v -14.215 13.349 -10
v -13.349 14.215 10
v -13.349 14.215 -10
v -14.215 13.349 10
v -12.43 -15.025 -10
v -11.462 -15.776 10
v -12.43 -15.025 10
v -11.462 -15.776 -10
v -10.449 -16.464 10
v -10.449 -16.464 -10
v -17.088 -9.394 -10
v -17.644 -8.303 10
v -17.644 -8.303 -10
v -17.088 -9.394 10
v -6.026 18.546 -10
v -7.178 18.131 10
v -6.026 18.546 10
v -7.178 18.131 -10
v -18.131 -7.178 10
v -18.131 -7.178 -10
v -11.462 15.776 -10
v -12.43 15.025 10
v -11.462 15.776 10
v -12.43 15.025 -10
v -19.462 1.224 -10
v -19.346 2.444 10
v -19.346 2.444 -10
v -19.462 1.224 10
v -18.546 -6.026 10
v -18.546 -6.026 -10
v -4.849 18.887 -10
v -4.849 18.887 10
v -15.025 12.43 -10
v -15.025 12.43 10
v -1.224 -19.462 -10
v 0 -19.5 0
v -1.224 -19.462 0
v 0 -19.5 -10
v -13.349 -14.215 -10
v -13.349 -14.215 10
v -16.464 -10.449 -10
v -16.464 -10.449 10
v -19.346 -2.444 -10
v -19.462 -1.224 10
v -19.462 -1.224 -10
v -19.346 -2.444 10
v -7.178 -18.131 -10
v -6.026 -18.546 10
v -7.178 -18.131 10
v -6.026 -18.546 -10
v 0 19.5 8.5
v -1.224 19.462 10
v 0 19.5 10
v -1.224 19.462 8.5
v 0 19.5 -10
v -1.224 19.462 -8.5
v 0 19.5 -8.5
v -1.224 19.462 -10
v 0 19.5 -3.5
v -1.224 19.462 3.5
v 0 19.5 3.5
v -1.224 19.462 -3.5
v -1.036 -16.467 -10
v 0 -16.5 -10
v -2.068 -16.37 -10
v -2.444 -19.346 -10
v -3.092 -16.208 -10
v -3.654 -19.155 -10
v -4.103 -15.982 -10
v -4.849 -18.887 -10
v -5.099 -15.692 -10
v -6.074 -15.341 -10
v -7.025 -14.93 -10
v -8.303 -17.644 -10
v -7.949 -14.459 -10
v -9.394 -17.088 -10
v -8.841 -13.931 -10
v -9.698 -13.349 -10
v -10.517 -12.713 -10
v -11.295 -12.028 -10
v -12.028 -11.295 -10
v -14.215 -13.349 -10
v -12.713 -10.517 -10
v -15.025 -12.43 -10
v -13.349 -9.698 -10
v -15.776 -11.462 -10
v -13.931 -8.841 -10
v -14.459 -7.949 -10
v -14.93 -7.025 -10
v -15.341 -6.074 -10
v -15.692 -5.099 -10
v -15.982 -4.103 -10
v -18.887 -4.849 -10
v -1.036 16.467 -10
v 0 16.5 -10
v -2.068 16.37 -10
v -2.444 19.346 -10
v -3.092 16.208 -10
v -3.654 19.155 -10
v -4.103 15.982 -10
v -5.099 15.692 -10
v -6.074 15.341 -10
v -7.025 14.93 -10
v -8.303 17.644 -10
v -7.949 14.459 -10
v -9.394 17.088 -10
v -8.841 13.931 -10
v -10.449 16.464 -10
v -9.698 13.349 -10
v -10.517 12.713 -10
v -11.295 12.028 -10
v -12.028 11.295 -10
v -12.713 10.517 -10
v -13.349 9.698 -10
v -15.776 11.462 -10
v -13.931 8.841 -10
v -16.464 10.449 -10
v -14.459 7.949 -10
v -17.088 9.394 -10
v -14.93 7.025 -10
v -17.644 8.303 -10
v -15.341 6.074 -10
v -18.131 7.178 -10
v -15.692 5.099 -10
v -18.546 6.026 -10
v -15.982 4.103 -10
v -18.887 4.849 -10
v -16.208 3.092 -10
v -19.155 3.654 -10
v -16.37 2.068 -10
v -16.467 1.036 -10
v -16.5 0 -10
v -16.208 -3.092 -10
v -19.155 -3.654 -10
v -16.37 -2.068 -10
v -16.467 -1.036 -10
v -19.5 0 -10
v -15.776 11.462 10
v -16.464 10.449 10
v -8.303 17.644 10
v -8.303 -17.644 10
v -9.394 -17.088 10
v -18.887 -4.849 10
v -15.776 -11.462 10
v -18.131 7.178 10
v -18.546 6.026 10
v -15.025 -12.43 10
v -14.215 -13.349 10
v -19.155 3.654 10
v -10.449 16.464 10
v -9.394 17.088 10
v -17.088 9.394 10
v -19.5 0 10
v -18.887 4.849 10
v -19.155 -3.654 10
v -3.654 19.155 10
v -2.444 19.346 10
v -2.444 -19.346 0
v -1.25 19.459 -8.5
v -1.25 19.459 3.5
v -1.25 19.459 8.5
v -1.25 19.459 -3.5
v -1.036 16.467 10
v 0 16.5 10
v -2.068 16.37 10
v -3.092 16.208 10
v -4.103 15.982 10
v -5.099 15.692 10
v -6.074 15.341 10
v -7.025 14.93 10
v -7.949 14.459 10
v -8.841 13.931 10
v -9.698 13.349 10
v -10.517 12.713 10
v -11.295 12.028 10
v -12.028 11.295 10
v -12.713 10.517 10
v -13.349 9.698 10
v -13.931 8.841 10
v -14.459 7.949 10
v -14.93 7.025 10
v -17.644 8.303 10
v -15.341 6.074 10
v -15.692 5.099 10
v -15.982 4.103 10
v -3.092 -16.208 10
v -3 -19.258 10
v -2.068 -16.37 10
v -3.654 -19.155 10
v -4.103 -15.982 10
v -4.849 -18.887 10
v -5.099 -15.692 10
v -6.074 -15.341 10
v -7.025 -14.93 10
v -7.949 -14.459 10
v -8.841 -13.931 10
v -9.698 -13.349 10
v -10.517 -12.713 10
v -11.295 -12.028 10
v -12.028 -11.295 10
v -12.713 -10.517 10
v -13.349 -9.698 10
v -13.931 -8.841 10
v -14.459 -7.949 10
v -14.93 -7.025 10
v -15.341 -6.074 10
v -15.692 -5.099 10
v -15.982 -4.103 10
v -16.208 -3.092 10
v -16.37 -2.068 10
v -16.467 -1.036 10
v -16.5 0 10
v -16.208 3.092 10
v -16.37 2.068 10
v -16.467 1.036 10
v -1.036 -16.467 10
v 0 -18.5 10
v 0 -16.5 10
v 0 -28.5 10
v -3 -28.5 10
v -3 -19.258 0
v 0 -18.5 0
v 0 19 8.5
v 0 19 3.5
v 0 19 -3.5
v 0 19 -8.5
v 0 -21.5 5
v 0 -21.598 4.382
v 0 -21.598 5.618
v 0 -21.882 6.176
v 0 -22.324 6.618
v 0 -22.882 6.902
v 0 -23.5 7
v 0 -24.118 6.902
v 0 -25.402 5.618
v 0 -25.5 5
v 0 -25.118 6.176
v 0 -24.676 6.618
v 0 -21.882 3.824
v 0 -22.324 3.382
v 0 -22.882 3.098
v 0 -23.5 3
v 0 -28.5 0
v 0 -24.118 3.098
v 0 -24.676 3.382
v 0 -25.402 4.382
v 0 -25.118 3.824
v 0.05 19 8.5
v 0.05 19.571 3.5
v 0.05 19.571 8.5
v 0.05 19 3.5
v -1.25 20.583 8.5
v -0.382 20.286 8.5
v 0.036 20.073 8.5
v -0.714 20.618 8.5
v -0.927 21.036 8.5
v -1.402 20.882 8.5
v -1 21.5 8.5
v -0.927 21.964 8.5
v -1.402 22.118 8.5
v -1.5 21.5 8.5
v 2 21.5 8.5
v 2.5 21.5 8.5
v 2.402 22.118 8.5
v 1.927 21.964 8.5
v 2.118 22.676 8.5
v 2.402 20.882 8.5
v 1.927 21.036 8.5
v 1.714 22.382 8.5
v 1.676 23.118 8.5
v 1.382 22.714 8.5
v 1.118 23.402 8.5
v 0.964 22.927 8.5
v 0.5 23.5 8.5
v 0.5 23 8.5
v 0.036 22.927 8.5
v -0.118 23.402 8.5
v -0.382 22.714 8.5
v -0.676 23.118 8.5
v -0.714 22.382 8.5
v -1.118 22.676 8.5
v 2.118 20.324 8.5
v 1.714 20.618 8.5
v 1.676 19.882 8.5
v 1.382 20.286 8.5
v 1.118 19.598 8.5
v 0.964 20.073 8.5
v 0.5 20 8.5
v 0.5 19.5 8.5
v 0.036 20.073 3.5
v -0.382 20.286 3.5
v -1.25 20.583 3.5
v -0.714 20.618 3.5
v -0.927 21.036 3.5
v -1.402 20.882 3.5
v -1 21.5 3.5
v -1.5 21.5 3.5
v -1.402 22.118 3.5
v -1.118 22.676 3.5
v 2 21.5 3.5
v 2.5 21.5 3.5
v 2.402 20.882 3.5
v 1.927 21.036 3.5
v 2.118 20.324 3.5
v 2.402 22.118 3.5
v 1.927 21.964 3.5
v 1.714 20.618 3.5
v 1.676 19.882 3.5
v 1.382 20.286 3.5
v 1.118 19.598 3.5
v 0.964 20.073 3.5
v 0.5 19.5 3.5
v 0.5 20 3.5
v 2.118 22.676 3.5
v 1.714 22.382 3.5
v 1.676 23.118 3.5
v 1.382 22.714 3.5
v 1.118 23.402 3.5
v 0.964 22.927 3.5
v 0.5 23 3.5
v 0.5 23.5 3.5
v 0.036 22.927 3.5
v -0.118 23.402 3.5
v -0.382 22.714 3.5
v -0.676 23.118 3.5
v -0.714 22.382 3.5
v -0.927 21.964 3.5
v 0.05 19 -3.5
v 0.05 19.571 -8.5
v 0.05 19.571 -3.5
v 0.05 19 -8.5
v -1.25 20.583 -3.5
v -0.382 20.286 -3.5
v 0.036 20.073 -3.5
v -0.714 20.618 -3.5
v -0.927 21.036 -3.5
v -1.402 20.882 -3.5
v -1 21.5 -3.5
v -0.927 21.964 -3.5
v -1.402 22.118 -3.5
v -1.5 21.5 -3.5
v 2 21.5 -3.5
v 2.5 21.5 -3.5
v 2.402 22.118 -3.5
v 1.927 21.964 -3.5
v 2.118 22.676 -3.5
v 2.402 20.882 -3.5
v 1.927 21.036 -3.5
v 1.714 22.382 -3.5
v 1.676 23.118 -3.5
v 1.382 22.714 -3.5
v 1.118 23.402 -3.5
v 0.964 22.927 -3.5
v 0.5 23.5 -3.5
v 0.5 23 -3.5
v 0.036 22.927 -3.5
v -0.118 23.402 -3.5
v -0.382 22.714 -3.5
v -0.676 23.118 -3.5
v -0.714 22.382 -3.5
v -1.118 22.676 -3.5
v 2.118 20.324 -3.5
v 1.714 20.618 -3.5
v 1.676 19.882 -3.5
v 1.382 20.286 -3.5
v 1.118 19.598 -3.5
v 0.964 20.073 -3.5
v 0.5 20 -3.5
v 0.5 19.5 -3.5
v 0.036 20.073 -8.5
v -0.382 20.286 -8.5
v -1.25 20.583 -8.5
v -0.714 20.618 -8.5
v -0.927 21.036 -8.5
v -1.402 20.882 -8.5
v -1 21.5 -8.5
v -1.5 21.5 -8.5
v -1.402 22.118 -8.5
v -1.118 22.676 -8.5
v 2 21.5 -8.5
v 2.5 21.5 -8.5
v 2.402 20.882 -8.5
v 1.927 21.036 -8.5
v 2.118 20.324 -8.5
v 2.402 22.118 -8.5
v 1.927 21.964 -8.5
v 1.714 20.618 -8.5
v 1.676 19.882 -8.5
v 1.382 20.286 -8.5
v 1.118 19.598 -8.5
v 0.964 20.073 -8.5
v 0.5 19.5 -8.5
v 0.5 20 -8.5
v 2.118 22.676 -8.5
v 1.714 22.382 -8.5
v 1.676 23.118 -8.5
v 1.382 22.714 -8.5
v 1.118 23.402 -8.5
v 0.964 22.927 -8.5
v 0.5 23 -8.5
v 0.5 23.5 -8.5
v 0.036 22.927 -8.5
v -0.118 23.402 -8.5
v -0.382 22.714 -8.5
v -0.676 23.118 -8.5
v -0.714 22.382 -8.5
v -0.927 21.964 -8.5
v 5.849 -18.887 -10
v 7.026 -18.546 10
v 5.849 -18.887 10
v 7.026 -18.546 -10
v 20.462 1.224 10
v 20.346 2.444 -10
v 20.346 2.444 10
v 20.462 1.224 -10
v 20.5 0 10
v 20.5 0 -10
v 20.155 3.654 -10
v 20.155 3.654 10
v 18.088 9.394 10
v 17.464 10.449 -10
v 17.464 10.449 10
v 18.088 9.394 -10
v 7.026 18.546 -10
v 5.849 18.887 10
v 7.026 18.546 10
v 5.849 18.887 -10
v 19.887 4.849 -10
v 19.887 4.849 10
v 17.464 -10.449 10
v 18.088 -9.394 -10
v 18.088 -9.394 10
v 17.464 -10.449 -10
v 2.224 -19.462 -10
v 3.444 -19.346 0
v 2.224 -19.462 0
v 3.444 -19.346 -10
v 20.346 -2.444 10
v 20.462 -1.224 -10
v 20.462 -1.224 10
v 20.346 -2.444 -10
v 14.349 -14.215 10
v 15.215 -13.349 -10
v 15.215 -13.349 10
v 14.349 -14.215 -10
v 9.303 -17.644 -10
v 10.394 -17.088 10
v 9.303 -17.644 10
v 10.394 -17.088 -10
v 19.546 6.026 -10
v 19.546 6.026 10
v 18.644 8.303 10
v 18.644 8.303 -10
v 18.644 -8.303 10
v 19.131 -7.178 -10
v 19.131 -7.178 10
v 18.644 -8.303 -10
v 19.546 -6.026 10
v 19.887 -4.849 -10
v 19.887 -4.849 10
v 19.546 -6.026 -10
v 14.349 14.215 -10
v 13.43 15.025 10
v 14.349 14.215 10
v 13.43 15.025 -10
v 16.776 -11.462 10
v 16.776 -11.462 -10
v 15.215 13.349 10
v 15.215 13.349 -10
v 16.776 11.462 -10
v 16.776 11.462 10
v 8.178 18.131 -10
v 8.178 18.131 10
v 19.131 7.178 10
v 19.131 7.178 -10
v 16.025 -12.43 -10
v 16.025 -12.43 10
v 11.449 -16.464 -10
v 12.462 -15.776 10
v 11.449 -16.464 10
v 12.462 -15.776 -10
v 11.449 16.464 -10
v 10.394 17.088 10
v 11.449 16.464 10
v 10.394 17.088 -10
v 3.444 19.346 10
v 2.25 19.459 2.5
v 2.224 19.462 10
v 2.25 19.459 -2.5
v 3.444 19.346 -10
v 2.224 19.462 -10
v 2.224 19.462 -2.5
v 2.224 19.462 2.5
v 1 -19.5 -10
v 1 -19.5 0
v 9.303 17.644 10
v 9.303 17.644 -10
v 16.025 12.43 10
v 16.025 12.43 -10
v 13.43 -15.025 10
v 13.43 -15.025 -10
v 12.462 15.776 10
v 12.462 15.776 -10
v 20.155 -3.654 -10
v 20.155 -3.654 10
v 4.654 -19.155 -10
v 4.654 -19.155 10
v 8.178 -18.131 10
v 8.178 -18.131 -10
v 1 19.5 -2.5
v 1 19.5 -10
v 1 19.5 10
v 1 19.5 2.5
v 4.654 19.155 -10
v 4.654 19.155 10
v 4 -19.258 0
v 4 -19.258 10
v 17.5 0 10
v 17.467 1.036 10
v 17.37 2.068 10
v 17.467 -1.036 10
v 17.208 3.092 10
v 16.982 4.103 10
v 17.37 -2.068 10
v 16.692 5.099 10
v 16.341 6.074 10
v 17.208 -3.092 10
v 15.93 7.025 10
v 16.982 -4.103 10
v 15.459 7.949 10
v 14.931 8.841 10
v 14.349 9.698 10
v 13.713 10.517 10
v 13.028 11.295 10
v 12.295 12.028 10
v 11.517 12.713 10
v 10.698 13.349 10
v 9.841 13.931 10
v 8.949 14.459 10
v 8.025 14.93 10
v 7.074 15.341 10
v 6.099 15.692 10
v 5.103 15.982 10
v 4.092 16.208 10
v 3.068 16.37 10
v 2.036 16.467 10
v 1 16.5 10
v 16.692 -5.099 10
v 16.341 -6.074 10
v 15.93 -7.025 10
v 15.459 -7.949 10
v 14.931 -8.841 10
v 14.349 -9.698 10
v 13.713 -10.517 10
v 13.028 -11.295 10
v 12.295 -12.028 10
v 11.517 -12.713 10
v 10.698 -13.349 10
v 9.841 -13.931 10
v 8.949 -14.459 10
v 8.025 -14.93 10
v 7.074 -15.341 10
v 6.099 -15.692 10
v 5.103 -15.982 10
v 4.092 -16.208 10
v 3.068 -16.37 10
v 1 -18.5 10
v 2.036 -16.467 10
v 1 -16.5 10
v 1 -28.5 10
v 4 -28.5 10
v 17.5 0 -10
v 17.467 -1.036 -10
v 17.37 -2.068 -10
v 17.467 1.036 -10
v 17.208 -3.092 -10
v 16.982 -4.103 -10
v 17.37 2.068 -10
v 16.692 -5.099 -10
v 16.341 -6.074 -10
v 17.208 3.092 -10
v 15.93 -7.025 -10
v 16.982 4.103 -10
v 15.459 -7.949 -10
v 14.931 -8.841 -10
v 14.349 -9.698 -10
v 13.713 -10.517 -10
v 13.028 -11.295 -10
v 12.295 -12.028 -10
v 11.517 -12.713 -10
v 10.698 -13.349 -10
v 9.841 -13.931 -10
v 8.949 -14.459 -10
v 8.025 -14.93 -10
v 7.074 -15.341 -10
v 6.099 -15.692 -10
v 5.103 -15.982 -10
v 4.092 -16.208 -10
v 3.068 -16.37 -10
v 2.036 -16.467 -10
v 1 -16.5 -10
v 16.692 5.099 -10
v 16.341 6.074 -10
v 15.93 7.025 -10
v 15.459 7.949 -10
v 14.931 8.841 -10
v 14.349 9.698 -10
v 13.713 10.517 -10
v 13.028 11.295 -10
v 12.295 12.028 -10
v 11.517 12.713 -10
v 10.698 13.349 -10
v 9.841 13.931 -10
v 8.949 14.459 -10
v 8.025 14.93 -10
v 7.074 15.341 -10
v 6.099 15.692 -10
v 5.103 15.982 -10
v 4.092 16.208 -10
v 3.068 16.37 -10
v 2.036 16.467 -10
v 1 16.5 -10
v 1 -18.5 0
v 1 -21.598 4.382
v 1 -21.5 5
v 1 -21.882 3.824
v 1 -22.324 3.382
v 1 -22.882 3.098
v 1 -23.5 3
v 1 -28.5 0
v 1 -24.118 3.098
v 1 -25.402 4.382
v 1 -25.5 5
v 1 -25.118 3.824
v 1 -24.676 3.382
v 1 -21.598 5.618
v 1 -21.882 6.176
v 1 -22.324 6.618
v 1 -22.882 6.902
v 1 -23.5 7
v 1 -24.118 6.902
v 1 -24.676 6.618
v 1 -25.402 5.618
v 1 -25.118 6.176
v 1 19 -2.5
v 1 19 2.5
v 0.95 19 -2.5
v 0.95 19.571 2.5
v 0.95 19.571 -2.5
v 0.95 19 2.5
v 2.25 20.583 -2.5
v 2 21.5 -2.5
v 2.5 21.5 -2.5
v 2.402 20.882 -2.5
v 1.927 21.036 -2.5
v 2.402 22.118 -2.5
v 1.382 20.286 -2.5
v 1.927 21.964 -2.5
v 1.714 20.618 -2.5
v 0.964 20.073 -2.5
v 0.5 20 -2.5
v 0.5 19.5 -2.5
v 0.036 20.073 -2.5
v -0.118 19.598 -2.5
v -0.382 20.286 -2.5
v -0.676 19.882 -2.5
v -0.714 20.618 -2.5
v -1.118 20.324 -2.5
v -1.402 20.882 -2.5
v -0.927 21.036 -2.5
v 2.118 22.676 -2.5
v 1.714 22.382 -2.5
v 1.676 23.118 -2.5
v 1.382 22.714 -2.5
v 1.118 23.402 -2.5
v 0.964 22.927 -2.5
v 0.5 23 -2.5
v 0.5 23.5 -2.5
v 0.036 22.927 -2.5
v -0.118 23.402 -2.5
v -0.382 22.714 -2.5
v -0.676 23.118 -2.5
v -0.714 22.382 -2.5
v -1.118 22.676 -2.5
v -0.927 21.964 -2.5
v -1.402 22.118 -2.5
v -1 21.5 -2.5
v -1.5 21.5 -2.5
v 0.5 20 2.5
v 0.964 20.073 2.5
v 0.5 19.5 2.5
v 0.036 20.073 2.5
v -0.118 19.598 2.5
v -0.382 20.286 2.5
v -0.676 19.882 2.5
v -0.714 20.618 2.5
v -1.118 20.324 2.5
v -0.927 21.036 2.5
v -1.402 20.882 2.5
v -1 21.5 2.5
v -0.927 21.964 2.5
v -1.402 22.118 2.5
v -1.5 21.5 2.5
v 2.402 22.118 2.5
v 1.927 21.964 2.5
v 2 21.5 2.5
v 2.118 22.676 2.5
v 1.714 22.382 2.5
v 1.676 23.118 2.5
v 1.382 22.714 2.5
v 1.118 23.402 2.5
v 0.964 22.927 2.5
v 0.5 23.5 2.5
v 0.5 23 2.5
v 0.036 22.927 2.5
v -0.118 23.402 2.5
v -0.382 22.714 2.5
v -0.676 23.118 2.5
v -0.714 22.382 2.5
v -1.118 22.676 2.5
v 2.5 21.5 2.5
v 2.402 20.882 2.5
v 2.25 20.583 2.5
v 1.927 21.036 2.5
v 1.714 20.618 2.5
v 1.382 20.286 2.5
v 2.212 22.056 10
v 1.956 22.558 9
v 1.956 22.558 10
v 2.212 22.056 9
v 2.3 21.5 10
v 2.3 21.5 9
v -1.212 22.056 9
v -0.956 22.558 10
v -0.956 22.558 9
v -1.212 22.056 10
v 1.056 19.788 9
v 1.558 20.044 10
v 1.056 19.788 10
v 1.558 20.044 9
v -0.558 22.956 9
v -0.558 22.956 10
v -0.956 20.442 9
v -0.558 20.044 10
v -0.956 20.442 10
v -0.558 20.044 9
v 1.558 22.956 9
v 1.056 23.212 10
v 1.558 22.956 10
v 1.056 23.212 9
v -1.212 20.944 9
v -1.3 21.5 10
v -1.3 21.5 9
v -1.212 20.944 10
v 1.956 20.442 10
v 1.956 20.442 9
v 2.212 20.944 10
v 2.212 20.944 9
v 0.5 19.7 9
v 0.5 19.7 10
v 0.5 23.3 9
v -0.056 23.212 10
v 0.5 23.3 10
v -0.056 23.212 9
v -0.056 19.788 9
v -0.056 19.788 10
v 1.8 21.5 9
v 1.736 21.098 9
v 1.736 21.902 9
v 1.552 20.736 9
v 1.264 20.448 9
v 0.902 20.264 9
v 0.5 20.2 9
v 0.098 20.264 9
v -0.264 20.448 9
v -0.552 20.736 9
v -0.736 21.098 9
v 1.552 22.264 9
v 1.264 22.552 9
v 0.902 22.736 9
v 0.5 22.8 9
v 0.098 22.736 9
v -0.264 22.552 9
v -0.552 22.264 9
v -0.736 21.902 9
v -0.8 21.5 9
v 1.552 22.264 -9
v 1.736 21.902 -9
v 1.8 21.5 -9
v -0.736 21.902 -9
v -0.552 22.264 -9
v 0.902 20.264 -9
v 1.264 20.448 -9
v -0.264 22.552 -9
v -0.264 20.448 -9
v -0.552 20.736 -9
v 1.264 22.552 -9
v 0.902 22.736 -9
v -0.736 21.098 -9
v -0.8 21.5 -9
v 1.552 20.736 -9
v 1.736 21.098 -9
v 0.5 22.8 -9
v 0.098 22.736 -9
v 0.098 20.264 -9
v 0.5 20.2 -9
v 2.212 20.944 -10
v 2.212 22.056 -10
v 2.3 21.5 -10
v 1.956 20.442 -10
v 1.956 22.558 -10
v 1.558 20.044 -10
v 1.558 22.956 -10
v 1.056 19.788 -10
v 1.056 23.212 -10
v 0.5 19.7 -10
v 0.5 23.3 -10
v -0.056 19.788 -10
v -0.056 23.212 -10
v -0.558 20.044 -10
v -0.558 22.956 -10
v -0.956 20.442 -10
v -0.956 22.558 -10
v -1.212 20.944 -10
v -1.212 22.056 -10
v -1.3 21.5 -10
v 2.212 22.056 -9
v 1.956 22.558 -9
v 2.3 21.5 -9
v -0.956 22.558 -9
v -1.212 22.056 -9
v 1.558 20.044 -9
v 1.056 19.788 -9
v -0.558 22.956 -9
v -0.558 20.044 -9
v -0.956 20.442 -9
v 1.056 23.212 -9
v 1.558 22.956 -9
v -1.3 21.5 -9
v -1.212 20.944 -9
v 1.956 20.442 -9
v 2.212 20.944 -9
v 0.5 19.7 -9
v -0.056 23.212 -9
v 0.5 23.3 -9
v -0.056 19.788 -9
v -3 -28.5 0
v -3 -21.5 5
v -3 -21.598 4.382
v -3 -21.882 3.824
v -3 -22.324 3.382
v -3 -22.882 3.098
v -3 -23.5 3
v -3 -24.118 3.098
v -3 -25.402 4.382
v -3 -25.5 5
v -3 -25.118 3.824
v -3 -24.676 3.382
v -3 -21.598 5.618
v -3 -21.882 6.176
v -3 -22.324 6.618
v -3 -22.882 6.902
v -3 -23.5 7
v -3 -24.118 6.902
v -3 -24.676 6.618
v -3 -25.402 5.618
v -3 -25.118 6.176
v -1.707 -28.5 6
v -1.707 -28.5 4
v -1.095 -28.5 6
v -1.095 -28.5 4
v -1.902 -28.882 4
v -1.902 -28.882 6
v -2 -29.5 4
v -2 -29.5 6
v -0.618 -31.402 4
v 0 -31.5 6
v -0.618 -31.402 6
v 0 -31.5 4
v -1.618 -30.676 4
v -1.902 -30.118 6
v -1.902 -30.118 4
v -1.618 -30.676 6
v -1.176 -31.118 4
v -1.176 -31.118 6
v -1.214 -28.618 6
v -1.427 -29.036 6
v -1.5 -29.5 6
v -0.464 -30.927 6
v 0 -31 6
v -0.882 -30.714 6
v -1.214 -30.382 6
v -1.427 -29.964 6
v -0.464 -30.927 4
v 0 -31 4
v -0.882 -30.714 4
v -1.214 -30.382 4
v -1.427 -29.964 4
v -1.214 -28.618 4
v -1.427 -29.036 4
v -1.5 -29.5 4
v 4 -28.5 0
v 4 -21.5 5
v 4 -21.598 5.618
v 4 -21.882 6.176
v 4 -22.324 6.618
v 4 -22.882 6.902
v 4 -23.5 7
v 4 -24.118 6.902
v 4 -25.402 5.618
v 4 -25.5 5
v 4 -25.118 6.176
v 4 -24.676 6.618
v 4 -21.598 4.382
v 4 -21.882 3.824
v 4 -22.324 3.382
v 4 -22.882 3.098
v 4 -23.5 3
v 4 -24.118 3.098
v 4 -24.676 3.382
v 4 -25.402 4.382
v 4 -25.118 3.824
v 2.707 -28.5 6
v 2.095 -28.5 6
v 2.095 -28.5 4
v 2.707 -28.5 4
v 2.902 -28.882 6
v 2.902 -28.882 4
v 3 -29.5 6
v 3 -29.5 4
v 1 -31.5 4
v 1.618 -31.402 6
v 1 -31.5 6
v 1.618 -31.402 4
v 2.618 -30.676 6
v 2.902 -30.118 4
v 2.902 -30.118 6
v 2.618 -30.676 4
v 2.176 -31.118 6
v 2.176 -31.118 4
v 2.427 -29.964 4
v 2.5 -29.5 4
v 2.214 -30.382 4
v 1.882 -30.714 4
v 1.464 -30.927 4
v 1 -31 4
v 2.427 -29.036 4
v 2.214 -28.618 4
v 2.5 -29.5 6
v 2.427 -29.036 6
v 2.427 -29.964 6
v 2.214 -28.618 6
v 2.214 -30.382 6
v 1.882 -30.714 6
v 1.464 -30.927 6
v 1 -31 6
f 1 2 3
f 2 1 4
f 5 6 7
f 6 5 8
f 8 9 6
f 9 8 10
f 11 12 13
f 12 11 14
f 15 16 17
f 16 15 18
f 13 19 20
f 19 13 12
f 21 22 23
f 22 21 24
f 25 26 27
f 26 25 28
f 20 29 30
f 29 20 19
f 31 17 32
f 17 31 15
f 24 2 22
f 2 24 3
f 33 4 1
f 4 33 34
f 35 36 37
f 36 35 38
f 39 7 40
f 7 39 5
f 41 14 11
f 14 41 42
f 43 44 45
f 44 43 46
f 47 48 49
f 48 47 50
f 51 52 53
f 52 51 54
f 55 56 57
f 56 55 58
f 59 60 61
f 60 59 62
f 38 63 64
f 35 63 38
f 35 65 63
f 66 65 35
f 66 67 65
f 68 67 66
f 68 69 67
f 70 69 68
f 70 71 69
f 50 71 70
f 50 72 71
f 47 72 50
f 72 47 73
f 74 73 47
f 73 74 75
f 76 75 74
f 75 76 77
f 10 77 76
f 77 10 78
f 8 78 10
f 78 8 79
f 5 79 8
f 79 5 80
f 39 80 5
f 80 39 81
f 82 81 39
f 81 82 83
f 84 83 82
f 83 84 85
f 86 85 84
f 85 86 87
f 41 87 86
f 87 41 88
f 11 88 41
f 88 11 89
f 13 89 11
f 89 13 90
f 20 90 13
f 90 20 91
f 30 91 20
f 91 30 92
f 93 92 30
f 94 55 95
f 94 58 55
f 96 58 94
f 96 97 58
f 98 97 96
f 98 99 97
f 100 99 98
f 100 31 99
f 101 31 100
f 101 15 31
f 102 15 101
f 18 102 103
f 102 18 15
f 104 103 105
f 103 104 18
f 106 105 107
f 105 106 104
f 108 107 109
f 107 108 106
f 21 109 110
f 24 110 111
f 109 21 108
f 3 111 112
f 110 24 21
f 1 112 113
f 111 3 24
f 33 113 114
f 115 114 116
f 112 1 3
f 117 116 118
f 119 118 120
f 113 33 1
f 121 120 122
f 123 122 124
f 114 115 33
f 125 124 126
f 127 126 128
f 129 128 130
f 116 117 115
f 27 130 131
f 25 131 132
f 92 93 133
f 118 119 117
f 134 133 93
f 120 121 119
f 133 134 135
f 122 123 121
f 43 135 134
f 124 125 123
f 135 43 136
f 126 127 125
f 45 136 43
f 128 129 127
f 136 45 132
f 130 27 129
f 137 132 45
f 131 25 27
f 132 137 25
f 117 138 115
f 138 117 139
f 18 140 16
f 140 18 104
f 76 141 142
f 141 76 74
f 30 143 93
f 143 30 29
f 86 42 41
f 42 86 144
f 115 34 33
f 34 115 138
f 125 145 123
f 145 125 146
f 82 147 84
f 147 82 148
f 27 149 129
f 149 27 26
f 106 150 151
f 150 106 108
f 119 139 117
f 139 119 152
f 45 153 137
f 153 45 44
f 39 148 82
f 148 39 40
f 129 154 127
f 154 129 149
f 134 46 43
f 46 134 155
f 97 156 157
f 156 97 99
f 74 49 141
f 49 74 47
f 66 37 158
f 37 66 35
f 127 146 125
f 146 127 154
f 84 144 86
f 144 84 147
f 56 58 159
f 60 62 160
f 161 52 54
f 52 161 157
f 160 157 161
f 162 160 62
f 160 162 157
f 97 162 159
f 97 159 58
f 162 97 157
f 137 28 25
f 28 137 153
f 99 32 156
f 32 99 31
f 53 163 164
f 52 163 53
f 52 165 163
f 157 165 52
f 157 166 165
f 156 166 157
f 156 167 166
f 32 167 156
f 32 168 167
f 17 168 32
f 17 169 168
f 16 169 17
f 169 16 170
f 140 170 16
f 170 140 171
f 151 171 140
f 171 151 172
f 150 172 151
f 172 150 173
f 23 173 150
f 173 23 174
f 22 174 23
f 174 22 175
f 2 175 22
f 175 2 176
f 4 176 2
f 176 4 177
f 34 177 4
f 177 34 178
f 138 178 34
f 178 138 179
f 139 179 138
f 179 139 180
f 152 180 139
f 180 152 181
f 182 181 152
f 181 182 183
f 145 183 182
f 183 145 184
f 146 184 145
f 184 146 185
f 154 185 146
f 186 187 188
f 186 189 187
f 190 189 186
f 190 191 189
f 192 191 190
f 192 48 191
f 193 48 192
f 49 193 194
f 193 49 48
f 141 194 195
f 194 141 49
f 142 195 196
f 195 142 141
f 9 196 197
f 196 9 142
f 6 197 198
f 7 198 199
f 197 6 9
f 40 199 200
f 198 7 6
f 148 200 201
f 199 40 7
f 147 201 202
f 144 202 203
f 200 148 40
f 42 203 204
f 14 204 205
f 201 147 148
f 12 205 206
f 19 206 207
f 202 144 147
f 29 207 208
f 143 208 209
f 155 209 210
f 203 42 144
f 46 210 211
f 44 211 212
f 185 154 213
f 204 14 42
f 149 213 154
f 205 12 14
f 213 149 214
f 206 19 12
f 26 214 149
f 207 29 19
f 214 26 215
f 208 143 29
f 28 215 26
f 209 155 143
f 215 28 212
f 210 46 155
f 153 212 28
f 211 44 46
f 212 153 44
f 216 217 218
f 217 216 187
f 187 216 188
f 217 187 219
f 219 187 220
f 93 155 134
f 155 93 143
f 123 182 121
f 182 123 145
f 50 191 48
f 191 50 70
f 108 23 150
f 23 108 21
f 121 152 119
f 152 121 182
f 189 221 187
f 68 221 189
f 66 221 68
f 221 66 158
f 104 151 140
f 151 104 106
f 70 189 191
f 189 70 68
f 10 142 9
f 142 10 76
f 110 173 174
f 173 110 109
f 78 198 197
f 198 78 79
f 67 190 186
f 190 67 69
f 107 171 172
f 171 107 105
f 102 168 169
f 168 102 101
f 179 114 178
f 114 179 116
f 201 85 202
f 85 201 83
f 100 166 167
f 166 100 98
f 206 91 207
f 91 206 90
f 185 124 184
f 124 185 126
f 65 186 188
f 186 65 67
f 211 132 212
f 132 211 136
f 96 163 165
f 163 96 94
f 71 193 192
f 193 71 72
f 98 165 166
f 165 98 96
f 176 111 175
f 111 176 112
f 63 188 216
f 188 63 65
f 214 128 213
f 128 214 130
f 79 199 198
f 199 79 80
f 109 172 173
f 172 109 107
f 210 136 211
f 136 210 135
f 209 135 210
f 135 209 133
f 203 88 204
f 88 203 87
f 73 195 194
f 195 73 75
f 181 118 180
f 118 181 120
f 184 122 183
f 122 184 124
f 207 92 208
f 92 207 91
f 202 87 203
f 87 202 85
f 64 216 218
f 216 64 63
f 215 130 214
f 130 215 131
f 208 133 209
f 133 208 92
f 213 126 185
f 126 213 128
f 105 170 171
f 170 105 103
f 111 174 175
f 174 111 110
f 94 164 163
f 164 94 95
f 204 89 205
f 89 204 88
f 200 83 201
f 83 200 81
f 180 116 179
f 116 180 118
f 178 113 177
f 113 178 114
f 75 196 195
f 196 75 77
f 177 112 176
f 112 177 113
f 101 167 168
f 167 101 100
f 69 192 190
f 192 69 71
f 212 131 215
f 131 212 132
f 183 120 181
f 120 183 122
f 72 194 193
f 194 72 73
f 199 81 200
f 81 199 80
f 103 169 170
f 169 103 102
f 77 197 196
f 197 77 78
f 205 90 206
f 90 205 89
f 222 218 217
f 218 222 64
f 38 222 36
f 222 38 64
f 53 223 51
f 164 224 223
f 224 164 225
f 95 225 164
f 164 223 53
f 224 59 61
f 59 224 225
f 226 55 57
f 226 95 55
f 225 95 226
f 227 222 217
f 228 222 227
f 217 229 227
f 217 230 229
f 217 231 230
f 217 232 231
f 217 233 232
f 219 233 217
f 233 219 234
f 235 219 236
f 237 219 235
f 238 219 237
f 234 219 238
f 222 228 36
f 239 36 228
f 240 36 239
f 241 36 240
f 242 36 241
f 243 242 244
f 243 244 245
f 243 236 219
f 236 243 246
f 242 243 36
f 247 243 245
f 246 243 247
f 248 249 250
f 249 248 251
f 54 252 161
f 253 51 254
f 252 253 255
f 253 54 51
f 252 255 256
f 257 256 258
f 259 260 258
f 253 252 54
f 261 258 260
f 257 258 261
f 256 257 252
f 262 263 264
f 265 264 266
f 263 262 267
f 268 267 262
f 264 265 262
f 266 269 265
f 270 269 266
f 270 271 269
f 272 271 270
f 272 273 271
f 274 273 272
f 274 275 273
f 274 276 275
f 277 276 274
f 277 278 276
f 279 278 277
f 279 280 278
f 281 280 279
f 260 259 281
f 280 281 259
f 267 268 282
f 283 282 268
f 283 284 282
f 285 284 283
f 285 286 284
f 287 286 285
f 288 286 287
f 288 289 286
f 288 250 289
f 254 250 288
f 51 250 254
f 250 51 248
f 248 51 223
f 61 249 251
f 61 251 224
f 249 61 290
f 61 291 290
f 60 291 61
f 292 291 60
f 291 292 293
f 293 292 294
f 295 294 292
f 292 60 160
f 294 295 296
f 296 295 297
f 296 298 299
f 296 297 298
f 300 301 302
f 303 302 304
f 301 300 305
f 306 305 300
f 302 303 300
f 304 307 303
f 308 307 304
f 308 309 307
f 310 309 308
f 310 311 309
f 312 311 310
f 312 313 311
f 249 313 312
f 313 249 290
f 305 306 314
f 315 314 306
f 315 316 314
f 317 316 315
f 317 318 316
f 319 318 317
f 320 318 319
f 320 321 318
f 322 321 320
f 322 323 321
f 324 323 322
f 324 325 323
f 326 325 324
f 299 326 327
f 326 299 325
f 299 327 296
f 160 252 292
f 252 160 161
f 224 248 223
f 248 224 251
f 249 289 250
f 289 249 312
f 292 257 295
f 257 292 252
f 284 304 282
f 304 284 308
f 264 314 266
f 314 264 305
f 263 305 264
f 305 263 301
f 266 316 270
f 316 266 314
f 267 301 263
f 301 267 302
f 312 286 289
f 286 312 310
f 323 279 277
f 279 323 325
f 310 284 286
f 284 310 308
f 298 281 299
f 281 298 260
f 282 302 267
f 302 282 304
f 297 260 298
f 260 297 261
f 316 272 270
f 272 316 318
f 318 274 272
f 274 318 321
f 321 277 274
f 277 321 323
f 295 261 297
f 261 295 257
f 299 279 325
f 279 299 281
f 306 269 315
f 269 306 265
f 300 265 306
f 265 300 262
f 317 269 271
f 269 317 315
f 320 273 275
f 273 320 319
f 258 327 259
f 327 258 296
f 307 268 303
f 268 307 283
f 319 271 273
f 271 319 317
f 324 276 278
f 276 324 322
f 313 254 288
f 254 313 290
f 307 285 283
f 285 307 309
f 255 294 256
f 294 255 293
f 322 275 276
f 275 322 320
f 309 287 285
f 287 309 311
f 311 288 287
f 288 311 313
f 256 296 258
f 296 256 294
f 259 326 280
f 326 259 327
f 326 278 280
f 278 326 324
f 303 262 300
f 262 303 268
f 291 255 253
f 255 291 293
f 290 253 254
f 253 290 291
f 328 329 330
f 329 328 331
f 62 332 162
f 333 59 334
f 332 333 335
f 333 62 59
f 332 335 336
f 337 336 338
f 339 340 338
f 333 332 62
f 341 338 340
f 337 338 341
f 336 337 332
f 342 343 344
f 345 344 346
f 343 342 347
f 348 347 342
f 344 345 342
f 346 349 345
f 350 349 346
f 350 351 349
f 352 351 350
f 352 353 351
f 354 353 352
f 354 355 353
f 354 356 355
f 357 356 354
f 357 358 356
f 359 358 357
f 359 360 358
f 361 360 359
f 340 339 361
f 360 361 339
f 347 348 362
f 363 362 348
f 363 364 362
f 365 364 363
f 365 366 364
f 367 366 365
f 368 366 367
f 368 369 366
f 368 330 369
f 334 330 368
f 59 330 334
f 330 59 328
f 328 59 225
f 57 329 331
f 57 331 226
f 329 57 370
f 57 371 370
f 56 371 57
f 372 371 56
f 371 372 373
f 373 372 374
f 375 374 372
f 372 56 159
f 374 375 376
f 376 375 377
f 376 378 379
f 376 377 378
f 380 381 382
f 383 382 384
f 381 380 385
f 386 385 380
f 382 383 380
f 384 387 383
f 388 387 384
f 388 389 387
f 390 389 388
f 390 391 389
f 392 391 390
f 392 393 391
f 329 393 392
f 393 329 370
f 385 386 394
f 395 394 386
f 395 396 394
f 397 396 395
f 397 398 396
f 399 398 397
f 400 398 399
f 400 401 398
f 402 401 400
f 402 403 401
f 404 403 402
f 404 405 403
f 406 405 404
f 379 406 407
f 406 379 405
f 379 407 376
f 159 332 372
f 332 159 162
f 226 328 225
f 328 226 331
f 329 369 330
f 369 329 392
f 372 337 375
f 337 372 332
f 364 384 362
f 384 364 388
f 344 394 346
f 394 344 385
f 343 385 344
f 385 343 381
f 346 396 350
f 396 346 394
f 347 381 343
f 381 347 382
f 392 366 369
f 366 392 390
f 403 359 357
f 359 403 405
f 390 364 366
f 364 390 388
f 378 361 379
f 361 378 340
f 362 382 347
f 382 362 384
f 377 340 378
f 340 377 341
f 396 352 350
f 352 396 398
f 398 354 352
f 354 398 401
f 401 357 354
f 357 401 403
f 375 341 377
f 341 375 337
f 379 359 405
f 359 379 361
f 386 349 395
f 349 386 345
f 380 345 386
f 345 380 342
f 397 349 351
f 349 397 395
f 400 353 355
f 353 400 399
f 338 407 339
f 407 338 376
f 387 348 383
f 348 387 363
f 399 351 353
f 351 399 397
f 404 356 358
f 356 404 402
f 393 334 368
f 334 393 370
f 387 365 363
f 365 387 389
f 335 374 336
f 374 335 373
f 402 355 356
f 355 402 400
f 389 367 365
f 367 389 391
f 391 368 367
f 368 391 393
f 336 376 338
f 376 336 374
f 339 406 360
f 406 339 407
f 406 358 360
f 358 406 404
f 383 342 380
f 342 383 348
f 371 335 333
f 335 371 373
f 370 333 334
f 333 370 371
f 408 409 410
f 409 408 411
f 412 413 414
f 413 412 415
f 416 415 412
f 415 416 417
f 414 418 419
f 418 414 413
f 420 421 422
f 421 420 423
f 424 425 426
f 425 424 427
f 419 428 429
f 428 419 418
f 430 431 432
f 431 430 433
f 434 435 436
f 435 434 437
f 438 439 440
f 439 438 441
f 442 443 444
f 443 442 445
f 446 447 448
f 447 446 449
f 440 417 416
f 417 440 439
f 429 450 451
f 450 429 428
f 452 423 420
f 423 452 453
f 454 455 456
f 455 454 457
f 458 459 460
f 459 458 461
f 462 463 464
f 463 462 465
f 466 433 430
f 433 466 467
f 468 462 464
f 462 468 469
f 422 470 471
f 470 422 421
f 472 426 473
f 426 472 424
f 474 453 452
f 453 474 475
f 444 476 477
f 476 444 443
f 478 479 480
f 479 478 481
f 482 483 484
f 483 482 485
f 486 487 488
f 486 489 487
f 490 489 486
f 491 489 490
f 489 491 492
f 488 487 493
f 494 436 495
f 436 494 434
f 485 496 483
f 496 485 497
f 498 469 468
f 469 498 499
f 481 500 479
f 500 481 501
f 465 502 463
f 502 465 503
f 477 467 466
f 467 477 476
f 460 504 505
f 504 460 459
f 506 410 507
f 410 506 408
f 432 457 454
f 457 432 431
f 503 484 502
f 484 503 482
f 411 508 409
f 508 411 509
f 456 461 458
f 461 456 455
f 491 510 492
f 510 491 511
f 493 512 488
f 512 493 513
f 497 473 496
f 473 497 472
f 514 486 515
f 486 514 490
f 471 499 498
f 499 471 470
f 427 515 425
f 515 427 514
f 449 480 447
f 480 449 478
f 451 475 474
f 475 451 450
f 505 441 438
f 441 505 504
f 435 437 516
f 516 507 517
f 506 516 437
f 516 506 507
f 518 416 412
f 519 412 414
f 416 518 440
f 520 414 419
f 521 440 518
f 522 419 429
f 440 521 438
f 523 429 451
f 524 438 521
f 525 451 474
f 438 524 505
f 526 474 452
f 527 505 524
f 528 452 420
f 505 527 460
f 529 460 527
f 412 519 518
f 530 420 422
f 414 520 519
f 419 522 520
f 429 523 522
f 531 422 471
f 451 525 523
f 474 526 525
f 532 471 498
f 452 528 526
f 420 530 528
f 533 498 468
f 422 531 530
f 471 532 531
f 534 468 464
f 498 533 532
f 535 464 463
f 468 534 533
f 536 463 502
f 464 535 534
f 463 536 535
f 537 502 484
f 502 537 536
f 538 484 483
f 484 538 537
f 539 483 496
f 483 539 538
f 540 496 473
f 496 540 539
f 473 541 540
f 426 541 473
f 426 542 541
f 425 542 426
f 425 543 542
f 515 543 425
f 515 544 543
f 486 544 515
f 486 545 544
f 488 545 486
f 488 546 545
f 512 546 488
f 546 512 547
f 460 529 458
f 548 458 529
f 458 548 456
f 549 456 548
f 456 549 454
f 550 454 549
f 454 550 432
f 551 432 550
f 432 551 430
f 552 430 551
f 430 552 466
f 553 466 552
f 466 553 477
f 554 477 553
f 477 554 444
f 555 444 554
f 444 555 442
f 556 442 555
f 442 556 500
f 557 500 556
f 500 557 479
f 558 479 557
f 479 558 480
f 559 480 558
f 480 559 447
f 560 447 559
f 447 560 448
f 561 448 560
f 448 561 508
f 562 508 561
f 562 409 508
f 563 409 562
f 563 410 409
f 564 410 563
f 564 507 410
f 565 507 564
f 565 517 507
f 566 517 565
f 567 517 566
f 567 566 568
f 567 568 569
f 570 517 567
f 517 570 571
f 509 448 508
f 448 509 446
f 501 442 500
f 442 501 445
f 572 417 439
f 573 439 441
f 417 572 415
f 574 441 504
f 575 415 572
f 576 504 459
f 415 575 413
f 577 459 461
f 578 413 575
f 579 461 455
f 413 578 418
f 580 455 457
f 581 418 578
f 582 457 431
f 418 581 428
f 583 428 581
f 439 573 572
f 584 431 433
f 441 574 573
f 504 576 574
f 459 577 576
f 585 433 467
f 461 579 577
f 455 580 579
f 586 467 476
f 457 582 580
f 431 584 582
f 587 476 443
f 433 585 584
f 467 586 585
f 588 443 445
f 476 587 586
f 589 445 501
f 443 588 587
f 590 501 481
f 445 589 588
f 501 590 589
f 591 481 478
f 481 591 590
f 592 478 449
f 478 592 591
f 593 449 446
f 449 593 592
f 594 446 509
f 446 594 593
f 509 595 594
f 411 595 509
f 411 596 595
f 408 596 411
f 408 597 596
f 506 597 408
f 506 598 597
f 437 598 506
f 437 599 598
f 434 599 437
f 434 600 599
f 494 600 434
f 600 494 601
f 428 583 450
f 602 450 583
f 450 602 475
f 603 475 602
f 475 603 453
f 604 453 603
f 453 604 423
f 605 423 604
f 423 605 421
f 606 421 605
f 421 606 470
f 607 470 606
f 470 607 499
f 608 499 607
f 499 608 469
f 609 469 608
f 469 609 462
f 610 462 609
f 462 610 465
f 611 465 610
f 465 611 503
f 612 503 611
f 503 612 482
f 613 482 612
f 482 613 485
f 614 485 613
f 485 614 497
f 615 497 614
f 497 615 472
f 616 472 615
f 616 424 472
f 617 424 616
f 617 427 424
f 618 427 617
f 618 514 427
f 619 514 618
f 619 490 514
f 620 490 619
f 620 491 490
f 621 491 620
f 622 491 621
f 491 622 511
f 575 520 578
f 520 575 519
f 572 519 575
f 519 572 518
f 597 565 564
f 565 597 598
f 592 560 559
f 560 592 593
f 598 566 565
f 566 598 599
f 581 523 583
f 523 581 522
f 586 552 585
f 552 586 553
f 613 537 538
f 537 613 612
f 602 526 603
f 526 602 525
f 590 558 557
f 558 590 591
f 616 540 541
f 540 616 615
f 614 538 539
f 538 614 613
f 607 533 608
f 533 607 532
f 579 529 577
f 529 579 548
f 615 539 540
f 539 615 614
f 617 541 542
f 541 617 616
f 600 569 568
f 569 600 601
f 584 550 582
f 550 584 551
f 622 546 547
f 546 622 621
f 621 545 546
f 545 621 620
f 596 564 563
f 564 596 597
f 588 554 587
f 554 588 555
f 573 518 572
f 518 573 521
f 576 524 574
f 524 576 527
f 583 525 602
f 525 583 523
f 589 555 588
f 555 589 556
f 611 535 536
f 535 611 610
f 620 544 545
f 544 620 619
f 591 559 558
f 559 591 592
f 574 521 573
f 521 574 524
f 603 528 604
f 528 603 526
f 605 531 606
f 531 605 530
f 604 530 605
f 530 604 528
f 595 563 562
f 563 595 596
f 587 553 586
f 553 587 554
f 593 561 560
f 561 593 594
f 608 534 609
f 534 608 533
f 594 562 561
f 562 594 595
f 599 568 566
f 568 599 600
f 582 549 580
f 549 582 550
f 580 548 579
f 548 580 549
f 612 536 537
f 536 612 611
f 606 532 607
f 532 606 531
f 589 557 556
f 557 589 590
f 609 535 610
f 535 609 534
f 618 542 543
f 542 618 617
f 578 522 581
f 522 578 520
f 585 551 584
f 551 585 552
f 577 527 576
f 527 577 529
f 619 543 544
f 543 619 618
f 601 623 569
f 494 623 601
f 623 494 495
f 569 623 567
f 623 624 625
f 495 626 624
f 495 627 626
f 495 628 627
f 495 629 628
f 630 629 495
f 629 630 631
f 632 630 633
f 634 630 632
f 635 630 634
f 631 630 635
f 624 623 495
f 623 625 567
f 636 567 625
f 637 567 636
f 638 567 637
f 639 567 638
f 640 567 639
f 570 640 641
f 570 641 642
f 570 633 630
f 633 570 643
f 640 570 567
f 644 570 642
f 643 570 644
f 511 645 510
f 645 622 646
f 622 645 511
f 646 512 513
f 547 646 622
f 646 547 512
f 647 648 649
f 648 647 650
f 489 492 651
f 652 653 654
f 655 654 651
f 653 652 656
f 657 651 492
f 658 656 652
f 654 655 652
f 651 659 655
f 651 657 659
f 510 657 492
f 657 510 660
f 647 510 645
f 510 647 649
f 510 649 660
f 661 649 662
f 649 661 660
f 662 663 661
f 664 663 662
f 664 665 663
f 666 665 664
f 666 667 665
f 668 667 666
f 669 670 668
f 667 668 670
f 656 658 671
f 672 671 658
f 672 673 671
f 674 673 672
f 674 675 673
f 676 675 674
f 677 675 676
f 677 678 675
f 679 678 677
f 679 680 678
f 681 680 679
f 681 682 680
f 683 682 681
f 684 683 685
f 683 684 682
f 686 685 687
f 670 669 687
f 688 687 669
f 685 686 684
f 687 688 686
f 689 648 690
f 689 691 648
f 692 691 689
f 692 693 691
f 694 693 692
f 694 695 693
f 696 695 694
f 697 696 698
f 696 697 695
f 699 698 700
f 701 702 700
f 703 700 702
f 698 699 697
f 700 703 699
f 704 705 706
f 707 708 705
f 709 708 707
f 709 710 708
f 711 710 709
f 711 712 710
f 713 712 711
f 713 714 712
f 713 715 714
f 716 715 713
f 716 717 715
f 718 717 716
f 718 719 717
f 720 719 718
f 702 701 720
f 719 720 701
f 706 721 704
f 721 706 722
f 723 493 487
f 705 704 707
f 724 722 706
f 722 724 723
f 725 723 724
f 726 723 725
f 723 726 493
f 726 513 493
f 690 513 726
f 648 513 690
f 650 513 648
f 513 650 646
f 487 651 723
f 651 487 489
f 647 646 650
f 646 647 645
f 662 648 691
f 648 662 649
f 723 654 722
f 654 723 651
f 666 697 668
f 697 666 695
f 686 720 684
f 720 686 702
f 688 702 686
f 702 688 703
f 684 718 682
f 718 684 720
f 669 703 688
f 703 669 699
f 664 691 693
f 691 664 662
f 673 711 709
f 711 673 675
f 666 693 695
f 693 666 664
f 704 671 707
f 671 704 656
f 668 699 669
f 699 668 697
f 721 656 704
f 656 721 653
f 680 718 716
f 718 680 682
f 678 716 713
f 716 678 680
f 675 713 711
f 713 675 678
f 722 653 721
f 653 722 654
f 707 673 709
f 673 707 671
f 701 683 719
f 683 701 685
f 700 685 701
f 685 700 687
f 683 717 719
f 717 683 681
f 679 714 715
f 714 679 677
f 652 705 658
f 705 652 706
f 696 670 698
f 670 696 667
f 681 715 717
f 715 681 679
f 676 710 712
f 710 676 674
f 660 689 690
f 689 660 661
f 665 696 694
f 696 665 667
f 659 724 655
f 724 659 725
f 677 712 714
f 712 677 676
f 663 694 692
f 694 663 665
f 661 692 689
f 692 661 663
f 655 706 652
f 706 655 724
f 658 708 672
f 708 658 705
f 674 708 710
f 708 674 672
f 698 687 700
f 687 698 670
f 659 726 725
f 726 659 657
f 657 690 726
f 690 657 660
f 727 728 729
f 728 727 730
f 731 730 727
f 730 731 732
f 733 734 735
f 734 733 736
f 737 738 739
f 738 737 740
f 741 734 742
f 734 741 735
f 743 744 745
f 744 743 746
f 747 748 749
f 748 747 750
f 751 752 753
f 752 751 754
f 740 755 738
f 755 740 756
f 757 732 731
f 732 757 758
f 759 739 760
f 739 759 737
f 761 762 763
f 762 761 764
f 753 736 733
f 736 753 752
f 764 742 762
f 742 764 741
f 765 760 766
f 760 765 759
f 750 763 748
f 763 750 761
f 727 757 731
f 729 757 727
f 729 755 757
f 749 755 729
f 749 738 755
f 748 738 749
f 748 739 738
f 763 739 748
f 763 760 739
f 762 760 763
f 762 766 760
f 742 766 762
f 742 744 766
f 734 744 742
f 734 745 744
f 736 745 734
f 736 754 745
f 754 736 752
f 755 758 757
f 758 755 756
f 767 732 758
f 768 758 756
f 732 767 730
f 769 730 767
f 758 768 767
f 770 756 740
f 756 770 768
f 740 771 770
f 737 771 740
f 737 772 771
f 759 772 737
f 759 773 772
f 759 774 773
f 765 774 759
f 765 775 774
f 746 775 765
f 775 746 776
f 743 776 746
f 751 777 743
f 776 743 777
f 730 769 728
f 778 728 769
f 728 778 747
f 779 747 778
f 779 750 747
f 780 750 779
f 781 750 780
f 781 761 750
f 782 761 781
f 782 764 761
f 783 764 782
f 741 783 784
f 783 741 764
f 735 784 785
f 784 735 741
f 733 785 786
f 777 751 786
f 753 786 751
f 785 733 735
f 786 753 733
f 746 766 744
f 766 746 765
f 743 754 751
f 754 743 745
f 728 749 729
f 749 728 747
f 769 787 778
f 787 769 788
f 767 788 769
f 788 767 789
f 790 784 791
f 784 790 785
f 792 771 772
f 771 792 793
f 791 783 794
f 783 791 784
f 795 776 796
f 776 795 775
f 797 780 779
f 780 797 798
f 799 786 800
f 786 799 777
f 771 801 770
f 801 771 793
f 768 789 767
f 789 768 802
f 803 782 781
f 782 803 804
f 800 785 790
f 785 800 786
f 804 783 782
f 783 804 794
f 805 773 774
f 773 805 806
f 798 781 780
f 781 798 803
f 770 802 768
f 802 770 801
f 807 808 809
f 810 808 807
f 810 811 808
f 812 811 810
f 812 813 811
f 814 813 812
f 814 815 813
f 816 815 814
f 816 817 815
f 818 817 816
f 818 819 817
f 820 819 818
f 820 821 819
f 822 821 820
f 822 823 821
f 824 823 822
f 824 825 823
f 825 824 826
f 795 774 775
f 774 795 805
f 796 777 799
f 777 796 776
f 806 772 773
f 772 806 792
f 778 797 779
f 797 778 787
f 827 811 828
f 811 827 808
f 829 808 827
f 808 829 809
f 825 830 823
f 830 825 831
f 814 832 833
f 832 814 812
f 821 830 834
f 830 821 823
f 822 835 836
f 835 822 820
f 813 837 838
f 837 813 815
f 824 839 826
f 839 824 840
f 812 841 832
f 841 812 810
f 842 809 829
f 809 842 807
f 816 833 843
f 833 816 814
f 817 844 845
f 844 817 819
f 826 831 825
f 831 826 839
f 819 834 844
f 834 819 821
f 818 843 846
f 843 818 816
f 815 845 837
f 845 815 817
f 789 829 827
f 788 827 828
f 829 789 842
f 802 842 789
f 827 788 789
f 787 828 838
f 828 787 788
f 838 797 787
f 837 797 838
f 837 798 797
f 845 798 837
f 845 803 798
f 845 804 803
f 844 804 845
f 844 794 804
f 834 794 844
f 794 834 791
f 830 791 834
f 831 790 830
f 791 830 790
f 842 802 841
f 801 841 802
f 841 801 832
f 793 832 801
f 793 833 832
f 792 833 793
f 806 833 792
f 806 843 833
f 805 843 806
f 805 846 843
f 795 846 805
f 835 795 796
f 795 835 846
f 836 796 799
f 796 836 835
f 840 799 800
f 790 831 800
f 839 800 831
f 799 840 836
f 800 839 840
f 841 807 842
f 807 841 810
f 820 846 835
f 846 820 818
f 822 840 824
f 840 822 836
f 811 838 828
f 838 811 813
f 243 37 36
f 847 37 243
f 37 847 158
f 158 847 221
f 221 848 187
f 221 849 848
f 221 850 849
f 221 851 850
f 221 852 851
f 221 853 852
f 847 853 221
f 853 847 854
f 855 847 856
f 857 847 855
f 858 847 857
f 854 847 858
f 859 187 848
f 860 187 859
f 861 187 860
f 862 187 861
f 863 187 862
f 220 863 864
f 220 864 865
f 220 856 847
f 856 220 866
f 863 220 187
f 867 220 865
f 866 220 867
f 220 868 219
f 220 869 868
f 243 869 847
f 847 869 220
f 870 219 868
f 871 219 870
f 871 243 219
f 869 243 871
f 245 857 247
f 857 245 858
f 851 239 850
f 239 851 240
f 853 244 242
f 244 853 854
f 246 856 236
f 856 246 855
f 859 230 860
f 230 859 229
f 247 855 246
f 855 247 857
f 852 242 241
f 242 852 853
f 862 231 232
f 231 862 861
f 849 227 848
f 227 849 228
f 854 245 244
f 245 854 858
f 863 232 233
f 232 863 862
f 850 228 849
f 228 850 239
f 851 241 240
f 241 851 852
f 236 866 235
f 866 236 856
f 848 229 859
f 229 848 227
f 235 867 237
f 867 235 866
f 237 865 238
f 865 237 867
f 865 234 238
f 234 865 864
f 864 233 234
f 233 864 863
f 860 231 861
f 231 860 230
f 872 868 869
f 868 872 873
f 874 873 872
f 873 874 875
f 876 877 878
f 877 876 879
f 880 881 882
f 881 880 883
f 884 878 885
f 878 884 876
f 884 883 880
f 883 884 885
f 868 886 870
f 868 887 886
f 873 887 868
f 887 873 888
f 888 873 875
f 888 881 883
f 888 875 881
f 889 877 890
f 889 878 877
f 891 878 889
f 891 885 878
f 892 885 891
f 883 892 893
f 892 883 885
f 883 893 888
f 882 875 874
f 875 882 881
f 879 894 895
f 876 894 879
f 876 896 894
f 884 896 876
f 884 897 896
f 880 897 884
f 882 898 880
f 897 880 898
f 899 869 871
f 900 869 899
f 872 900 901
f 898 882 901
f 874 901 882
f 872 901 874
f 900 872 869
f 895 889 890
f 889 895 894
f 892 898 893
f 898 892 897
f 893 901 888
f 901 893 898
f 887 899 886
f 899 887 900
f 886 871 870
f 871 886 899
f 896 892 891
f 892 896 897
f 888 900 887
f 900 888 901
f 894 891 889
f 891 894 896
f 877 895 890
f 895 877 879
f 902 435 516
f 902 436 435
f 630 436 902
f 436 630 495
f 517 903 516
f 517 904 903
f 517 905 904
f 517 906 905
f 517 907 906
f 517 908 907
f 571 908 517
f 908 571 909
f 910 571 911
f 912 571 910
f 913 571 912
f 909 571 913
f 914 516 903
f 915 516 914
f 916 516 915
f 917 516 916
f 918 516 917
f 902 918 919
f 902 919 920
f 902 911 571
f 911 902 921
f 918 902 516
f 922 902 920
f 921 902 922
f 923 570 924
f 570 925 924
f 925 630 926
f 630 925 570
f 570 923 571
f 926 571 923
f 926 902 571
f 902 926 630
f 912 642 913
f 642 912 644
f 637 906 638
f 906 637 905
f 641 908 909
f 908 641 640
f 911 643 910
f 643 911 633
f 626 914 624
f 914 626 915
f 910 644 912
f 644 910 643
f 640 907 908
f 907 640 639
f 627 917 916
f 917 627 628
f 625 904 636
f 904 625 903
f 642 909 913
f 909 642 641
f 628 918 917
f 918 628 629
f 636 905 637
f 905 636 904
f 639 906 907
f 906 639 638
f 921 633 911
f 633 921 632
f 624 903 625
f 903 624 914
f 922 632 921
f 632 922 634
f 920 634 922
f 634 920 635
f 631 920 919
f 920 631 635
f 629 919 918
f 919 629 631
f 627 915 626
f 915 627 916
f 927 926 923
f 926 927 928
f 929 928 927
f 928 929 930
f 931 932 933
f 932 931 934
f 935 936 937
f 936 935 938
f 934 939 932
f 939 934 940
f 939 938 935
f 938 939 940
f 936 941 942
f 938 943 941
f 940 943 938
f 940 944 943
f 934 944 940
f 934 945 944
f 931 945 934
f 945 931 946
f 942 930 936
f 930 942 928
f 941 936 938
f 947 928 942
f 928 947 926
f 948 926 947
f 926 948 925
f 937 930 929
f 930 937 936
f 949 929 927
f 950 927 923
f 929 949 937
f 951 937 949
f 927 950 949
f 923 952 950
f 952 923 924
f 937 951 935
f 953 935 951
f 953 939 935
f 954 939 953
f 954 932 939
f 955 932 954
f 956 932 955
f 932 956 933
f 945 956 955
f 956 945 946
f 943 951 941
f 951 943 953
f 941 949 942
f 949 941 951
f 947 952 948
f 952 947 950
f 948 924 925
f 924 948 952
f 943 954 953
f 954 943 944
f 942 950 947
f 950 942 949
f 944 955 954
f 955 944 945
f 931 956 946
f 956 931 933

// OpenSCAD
/**
 * @file exoticCarbonForkBrakeGuide.scad
 *
 * @version 1.0
 *
 * @author Calum Judd Anderson
 *
 * @brief A guide for the brake line that wraps around the fork leg of eXotic Carbon fork leg
 */

$fa = 0.01;

INTERFERENCE_FIT = 0.001;
SLIDE_FIT = 0.05;


/**
 * @brief Makes a brake clamp
 */
module brakeLineClamp() {
    brakeHoseRadius = 2;
    brakeHoseHeight = 2;
    clampDepth = 10;
    
    union() {
        difference() {
            cube([3, clampDepth, clampDepth], center=true);
            rotate([0, 90, 0])
                cylinder(3 + INTERFERENCE_FIT, 2, 2, center=true, $fn=20);
        }

        translate([1.5, -((clampDepth/2) + brakeHoseHeight - 1), 0])
            difference() {
                cylinder(brakeHoseHeight, brakeHoseRadius, brakeHoseRadius, center=true, $fn=20);
                cylinder(brakeHoseHeight + INTERFERENCE_FIT, brakeHoseRadius - 0.5, brakeHoseRadius - 0.5, center=true, $fn=20);
                translate([brakeHoseRadius, 0, 0])
                    cube([brakeHoseRadius * 2, brakeHoseRadius * 2, brakeHoseRadius + INTERFERENCE_FIT], center=true);    
            }
        
    }
}

/**
 * @brief Creates a pivot through hole
 */
module pivotThroughHole() {
    throughHoleHeight = 5;

    union() {
        difference() {
            translate([-1.1, -1, 0])
                cube([1.3, 3, throughHoleHeight], center=true);
                cylinder(throughHoleHeight + INTERFERENCE_FIT, 2, 2, center=true, $fn=20);
        }

        difference() {
            cylinder(throughHoleHeight, 2, 2, center=true, $fn=20);
            cylinder(throughHoleHeight + INTERFERENCE_FIT, 1.5, 1.5, center=true, $fn=20);
        }
    }
}

module brakeGuide() {
    forkRadius = 16.5;
    brakeGuideHeight = 20;

    pivotThroughHoleOffset = forkRadius + 5;
    
    union() {
        /* Left Side */
        union() {
            difference() {
                cylinder(brakeGuideHeight, forkRadius + 3, forkRadius + 3, center=true, $fn=100);
                cylinder(brakeGuideHeight + INTERFERENCE_FIT, forkRadius, forkRadius, center=true, $fn=100);
                translate([forkRadius, 0, 0])
                    cube([forkRadius*2, forkRadius*4, brakeGuideHeight + INTERFERENCE_FIT], center=true);
            }

            translate([0.5, pivotThroughHoleOffset, 6])
                pivotThroughHole();
            translate([0.5, pivotThroughHoleOffset, -6])
                pivotThroughHole();
        }

        /* Right Side */
        translate([1, 0, 0])
            union() {
                difference() {
                    cylinder(brakeGuideHeight, forkRadius + 3, forkRadius + 3, center=true, $fn=100);
                    cylinder(brakeGuideHeight + INTERFERENCE_FIT, forkRadius, forkRadius, center=true, $fn=100);
                    translate([-forkRadius, 0, 0])
                        cube([forkRadius*2, forkRadius*4, brakeGuideHeight + INTERFERENCE_FIT], center=true);
                }

                translate([-0.5, pivotThroughHoleOffset, 0])
                    rotate([0, 180, 0])
                        pivotThroughHole();
            }

        /* Pivot Pin */
        translate([0.5, pivotThroughHoleOffset, 0])
            union() {
                /* Top Pivot Clamp */
                translate([0, 0, (brakeGuideHeight)/2 - 0.5])
                    cylinder(1, 1.8, 1.8, center=true, $fn=20);
                /* Pivot */
                cylinder(brakeGuideHeight, 1.3, 1.3, center=true, $fn=20);
                
                /* Bottom Pivot Clamp */
                translate([0, 0, -(brakeGuideHeight)/2 + 0.5])
                    cylinder(1, 1.8, 1.8, center=true, $fn=20);
            }

        /* Clamp */
        translate([-1.5, -forkRadius - 7, 5])
            brakeLineClamp();
            
        translate([2.5, -forkRadius - 7, 5])
            rotate([0, 180, 0])
                brakeLineClamp();
    }
}

brakeGuide();
